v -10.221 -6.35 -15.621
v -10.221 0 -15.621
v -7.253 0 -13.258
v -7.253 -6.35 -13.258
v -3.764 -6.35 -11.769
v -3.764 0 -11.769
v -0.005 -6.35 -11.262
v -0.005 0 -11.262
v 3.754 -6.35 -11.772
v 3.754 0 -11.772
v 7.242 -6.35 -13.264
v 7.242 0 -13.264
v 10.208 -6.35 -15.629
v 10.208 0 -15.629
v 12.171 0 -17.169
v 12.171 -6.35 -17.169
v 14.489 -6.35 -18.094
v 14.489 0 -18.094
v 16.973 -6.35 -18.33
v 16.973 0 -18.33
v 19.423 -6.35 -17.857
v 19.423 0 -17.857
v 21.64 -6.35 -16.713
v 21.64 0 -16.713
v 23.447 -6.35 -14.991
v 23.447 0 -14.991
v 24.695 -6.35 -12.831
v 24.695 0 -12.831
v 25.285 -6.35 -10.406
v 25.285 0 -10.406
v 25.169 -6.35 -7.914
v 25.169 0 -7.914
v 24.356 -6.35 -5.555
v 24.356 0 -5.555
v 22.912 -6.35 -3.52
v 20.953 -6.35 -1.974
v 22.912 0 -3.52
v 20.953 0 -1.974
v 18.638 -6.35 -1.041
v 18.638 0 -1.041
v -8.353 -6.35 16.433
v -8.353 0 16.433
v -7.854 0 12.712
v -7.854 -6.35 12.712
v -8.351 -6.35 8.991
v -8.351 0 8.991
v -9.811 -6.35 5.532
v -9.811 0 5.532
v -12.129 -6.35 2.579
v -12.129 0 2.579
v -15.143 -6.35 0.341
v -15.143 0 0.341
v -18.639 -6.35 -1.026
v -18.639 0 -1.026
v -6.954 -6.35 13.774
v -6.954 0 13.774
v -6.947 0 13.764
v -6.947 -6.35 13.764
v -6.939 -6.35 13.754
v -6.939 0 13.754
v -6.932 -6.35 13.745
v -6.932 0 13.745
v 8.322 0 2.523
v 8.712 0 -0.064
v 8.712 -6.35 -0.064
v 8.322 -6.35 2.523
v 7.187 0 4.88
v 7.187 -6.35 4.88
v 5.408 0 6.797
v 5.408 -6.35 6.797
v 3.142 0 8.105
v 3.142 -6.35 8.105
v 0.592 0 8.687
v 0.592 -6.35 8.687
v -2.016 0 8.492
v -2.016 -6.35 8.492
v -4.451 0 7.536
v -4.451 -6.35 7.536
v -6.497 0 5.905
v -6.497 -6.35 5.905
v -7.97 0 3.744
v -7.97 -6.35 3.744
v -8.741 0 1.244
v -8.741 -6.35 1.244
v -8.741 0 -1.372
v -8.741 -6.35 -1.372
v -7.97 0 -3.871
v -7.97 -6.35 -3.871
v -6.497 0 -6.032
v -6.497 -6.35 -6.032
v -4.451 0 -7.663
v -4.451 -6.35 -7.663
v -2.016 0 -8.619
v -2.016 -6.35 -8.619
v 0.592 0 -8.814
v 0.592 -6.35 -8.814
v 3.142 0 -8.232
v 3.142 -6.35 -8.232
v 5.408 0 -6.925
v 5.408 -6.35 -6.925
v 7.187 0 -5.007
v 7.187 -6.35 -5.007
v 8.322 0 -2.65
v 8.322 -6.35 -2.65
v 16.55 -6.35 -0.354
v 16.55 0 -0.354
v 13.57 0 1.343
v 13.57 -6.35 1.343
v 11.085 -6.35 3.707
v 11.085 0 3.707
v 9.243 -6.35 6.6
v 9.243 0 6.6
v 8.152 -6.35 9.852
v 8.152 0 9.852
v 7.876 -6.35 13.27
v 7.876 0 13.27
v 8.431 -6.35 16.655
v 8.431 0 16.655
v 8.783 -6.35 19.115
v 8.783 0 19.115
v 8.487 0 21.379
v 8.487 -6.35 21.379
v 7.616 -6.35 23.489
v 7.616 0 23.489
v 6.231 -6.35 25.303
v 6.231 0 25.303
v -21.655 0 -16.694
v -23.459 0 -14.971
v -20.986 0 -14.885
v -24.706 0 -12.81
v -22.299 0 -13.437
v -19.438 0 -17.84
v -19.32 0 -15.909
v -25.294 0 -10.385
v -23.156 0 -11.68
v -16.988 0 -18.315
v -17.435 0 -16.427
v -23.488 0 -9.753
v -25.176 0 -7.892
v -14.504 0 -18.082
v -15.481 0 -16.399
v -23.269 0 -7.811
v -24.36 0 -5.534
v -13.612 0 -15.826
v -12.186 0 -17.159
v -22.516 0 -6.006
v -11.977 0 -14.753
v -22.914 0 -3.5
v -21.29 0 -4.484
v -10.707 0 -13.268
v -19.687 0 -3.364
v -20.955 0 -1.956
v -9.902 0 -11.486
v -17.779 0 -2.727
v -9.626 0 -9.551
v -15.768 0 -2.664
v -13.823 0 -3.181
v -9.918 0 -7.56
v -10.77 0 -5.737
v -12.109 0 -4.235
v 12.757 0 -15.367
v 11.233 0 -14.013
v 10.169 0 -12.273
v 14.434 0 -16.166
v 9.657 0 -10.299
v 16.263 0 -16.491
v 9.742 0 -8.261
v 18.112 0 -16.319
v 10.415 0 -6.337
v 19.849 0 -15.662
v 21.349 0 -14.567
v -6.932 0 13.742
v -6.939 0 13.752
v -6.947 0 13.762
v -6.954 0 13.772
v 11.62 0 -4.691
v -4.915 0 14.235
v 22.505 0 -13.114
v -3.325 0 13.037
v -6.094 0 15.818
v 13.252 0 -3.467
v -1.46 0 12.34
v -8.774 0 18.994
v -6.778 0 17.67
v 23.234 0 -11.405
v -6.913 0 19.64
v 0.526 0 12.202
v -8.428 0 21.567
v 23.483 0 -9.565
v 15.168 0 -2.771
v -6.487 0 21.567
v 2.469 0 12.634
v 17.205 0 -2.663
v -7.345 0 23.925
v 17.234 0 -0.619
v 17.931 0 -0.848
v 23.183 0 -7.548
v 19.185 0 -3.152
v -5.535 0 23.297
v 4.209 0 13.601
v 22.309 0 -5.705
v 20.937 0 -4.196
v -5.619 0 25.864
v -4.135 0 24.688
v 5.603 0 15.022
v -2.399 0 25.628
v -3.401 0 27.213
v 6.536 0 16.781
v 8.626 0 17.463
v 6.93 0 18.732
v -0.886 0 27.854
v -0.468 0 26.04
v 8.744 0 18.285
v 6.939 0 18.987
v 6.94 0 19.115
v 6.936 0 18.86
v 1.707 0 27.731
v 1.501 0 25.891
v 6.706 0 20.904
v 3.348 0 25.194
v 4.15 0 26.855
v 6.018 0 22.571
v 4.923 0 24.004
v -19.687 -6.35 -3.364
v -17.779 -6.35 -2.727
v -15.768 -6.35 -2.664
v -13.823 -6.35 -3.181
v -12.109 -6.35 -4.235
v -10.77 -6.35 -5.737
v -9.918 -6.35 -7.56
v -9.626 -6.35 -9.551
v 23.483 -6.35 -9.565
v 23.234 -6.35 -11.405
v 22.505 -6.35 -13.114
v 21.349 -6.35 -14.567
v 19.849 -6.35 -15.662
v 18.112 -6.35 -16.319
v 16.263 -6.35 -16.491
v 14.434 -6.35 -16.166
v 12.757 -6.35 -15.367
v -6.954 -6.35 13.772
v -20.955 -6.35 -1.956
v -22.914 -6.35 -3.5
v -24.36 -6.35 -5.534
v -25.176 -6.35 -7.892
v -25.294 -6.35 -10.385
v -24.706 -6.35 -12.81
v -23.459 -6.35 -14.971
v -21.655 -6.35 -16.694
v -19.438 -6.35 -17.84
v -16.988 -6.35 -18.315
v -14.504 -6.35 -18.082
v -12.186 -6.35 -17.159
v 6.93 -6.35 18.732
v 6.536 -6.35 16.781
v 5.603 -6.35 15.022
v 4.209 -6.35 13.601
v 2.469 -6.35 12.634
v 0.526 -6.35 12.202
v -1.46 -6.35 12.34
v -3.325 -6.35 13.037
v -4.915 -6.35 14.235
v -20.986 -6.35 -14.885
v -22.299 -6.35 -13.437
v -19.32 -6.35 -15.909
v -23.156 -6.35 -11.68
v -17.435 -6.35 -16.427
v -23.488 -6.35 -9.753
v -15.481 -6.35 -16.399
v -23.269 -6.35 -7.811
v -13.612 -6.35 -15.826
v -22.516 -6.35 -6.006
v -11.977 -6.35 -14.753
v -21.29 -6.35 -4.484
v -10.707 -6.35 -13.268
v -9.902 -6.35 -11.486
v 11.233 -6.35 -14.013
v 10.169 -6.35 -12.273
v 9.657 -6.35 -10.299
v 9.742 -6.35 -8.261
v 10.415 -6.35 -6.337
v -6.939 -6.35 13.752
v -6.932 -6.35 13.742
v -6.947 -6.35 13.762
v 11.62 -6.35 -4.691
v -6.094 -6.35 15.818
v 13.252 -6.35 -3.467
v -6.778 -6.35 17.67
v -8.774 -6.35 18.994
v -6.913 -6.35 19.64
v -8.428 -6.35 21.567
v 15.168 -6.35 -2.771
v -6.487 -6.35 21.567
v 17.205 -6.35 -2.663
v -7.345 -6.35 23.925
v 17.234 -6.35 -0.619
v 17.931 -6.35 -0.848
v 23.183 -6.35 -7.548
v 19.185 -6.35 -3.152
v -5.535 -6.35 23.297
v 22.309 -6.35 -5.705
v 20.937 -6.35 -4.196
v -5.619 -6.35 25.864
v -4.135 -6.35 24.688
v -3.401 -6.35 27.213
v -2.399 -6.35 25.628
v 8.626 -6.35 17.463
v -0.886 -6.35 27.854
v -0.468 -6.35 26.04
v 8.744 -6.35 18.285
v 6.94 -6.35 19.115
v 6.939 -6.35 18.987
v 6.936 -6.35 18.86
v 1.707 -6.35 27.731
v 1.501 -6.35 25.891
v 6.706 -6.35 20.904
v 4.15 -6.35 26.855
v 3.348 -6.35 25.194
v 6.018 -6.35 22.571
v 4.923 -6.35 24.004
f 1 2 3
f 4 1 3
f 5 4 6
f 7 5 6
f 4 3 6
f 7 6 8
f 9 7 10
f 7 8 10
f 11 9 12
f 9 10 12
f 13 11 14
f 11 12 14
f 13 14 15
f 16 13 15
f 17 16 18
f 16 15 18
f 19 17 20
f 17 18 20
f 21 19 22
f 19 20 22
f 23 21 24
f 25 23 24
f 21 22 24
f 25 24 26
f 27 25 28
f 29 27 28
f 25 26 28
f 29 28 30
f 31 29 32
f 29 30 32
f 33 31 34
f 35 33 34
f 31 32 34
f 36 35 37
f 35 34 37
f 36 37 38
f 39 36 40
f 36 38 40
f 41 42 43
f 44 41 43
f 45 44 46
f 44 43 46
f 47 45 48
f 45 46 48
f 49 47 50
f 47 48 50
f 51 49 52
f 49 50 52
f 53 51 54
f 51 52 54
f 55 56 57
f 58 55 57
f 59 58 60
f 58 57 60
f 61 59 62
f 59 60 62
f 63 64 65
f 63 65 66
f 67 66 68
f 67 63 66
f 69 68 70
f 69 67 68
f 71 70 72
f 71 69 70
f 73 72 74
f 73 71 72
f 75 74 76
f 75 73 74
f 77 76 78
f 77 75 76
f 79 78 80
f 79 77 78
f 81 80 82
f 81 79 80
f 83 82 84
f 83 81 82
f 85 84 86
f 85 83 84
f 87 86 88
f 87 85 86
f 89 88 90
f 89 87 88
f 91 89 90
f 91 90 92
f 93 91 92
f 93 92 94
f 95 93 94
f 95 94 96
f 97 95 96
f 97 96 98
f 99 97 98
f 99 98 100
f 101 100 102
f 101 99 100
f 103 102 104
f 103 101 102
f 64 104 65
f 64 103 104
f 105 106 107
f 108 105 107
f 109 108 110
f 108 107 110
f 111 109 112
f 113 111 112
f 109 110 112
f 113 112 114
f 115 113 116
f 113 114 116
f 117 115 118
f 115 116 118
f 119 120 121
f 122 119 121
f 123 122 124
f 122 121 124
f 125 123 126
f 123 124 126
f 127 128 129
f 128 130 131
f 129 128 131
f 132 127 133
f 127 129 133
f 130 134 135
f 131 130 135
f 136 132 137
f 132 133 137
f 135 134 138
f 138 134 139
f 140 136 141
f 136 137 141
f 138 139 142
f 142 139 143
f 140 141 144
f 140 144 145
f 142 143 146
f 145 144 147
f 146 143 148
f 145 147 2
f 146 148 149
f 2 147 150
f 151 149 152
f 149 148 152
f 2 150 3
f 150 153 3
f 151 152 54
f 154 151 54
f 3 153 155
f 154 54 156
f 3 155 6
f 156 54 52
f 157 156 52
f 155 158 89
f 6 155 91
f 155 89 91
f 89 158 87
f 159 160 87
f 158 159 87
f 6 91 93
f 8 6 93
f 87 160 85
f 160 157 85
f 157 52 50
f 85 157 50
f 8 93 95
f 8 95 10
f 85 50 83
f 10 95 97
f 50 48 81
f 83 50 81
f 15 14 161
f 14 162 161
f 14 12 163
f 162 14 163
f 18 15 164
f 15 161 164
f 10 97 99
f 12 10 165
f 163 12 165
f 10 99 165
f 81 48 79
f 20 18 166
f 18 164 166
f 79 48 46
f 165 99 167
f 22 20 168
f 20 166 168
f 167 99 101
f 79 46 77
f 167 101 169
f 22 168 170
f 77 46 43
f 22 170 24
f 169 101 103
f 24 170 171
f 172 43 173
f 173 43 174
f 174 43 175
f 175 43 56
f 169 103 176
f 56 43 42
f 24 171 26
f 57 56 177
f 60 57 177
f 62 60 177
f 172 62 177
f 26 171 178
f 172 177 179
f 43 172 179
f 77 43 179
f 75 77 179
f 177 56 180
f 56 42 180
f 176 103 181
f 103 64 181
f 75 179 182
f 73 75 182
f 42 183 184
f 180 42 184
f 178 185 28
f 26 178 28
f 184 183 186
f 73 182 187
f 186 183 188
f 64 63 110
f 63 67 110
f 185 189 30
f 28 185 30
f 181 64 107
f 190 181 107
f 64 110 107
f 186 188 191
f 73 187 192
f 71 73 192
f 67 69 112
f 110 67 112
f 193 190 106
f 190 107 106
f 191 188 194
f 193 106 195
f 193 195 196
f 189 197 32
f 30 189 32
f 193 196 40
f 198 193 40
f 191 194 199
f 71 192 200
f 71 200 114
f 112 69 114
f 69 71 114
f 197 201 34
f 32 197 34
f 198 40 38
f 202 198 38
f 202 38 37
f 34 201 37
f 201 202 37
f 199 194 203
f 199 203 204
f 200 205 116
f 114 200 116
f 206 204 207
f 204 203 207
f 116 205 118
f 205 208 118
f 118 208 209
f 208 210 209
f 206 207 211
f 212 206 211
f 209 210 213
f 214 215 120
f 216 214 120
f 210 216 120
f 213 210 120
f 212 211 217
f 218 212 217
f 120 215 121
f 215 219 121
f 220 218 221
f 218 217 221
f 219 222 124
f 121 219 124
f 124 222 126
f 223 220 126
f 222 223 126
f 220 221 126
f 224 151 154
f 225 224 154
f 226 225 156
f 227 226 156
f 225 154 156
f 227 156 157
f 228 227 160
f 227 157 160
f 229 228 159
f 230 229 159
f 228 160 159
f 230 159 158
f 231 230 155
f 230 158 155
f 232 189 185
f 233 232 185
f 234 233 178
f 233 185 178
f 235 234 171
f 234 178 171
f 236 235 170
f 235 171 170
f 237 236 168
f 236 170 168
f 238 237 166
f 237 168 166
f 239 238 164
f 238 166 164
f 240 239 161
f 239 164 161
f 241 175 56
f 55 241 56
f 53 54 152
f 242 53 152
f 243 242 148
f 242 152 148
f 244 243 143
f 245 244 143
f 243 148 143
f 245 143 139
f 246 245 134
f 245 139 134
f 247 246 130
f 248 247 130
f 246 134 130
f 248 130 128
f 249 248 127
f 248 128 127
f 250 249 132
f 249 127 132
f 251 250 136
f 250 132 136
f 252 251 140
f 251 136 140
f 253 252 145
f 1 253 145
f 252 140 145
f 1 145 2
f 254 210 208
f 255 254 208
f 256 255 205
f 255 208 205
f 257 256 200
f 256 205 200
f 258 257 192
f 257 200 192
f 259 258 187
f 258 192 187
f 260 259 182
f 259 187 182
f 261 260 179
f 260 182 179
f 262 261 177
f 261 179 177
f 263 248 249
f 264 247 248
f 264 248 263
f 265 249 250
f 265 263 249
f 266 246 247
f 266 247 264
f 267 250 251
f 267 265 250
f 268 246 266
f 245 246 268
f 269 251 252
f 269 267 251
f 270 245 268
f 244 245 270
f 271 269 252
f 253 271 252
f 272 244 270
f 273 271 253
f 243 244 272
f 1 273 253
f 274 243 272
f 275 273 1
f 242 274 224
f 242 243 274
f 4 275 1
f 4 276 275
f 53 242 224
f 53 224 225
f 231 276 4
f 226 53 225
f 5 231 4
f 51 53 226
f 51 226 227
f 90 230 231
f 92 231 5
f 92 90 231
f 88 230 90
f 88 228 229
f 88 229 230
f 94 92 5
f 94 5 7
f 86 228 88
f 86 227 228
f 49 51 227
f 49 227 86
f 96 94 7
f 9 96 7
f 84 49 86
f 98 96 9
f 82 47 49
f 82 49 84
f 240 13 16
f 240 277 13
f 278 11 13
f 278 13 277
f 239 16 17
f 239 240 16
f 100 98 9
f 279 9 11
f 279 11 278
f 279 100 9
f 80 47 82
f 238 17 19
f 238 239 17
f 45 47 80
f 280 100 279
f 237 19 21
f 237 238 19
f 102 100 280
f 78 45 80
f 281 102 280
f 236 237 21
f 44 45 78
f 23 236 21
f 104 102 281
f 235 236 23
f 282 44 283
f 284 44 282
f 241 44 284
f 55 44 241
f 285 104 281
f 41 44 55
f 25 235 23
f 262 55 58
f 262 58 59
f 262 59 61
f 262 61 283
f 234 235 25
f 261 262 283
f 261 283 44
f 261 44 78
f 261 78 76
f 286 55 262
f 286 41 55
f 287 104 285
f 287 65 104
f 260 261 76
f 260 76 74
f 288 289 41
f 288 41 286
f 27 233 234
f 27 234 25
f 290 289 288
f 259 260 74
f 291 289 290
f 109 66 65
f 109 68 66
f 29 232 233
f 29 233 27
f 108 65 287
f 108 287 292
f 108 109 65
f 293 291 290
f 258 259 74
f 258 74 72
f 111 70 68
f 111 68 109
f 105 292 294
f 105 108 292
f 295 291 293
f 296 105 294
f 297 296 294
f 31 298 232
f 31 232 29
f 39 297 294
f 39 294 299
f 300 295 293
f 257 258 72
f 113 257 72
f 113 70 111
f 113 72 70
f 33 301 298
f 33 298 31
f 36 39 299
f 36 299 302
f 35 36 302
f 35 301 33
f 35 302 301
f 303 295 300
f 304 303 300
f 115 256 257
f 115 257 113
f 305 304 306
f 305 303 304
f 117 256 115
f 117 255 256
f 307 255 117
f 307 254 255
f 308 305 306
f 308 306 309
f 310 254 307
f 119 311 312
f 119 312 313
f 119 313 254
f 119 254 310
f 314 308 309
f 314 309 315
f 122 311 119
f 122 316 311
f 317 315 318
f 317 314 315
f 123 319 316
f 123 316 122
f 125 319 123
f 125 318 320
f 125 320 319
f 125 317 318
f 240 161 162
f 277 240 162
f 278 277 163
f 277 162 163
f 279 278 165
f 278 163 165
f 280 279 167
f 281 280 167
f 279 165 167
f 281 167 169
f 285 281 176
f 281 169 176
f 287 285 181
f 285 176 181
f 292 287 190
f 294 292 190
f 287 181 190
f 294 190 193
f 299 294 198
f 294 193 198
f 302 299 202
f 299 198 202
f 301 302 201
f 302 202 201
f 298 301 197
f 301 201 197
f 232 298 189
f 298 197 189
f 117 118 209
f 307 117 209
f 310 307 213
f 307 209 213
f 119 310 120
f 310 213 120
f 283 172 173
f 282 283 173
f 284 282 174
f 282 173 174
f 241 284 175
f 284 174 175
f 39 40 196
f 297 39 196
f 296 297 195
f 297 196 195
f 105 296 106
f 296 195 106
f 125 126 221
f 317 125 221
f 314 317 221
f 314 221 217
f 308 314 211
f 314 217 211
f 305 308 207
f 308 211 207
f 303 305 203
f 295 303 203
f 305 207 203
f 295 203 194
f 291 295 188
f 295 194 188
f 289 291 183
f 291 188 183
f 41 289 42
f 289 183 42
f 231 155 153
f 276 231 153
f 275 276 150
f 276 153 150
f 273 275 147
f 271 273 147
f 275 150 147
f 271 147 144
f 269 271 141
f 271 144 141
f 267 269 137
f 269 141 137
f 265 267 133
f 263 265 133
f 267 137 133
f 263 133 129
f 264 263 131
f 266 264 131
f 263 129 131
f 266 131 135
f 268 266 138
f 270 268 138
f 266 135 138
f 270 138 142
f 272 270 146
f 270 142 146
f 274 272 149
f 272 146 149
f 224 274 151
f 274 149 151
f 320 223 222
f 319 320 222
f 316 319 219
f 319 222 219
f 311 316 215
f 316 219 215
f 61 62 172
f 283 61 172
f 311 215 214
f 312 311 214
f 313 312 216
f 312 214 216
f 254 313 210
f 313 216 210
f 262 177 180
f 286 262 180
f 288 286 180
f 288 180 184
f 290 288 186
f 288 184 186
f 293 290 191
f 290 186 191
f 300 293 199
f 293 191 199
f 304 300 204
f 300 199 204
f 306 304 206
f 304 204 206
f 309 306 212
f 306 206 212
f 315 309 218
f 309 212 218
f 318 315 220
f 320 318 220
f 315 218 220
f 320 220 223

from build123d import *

# Parameters (mm, degrees)
F0_R     = 8.7753218572
F1_DEPTH = 6.35


with BuildPart() as f1:
    # F0 (on Front) → F1 (new body)
    with BuildSketch(Plane.XZ):
        with BuildLine():
            Line((8.7834438126, 19.115327031), (8.7753180449, 19.115327031))
            ThreePointArc((8.7753180449, 19.115327031), (8.1158254027, 22.4611173931), (6.2307064983, 25.3028722046))
            ThreePointArc((6.2307064983, 25.3028722046), (-4.4505028044, 26.673563518), (-8.4172791945, 16.6619846257))
            ThreePointArc((-8.4172791945, 16.6619846257), (-8.3844908458, 16.547589737), (-8.3526665154, 16.4329229223))
            ThreePointArc((-8.3526665154, 16.4329229223), (-9.8106463605, 5.532295474), (-18.6392198096, -1.0255757391))
            ThreePointArc((-18.6392198096, -1.0255757391), (-24.1599350394, -13.9350611847), (-10.2210623661, -15.6205699261))
            ThreePointArc((-10.2210623661, -15.6205699261), (-0.0047850834, -11.2618653325), (10.2077845484, -15.6292499923))
            ThreePointArc((10.2077845484, -15.6292499923), (24.148084509, -13.9555869055), (18.6383415606, -1.0414146996))
            ThreePointArc((18.6383415606, -1.0414146996), (17.5809373703, -0.7383140879), (16.5502978295, -0.3539240006))
            ThreePointArc((16.5502978295, -0.3539240006), (9.2433481318, 6.600298379), (8.4314352612, 16.6548257314))
            ThreePointArc((8.4314352612, 16.6548257314), (8.6949959346, 17.8725502343), (8.7834438126, 19.115327031))
        make_face()
        with BuildLine():
            ThreePointArc((-19.6872001667, -3.3644723848), (-12.9274465593, -3.6452218097), (-9.6260458218, -9.5506296907))
            ThreePointArc((-9.6260458218, -9.5506296907), (-20.189393023, -15.4560375718), (-19.6872001667, -3.3644723848))
        make_face(mode=Mode.SUBTRACT)
        with Locations((-0.0637440243, -0.0636884644)):
            Circle(F0_R, mode=Mode.SUBTRACT)
        with BuildLine():
            ThreePointArc((12.7573186389, -15.3673792813), (13.2515512011, -3.4674783406), (23.4826717993, -9.5646973403))
            ThreePointArc((23.4826717993, -9.5646973403), (19.8490444587, -15.6619163401), (12.7573186389, -15.3673792813))
        make_face(mode=Mode.SUBTRACT)
        with BuildLine():
            Line((-6.9544768432, 13.7717279244), (-6.9544670424, 13.7741073238))
            ThreePointArc((-6.9544670424, 13.7741073238), (-6.943095823, 13.7593168639), (-6.9316931846, 13.7445506127))
            Line((-6.9316931846, 13.7445506127), (-6.9316934696, 13.7422512771))
            ThreePointArc((-6.9316934696, 13.7422512771), (-6.9431007991, 13.75697751), (-6.9544768432, 13.7717279244))
        make_face(mode=Mode.SUBTRACT)
        with BuildLine():
            ThreePointArc((6.9298815278, 18.7318516666), (2.4688362723, 12.6343784947), (-4.9148938035, 14.2345766142))
            ThreePointArc((-4.9148938035, 14.2345766142), (-4.884841452, 24.0424621937), (4.9230157544, 24.0042561422))
            ThreePointArc((4.9230157544, 24.0042561422), (6.4163077672, 21.7597482397), (6.9404959307, 19.115327031))
            ThreePointArc((6.9404959307, 19.115327031), (6.9378418219, 18.9235159126), (6.9298815278, 18.7318516666))
        make_face(mode=Mode.SUBTRACT)
        with BuildLine():
            ThreePointArc((6.2307064983, 25.3028722046), (8.1158254027, 22.4611173931), (8.7753180449, 19.115327031))
            Line((8.7753180449, 19.115327031), (8.7834438126, 19.115327031))
            ThreePointArc((8.7834438126, 19.115327031), (8.1201949286, 22.4620486758), (6.2307064983, 25.3028722046))
        make_face()
        with BuildLine():
            ThreePointArc((-8.4172791945, 16.6619846257), (-4.4505028044, 26.673563518), (6.2307064983, 25.3028722046))
            ThreePointArc((6.2307064983, 25.3028722046), (-4.5601182711, 26.6209449467), (-8.3526665154, 16.4329229223))
            ThreePointArc((-8.3526665154, 16.4329229223), (-8.3844908458, 16.547589737), (-8.4172791945, 16.6619846257))
        make_face()
    extrude(amount=F1_DEPTH)


solid = f1.part
